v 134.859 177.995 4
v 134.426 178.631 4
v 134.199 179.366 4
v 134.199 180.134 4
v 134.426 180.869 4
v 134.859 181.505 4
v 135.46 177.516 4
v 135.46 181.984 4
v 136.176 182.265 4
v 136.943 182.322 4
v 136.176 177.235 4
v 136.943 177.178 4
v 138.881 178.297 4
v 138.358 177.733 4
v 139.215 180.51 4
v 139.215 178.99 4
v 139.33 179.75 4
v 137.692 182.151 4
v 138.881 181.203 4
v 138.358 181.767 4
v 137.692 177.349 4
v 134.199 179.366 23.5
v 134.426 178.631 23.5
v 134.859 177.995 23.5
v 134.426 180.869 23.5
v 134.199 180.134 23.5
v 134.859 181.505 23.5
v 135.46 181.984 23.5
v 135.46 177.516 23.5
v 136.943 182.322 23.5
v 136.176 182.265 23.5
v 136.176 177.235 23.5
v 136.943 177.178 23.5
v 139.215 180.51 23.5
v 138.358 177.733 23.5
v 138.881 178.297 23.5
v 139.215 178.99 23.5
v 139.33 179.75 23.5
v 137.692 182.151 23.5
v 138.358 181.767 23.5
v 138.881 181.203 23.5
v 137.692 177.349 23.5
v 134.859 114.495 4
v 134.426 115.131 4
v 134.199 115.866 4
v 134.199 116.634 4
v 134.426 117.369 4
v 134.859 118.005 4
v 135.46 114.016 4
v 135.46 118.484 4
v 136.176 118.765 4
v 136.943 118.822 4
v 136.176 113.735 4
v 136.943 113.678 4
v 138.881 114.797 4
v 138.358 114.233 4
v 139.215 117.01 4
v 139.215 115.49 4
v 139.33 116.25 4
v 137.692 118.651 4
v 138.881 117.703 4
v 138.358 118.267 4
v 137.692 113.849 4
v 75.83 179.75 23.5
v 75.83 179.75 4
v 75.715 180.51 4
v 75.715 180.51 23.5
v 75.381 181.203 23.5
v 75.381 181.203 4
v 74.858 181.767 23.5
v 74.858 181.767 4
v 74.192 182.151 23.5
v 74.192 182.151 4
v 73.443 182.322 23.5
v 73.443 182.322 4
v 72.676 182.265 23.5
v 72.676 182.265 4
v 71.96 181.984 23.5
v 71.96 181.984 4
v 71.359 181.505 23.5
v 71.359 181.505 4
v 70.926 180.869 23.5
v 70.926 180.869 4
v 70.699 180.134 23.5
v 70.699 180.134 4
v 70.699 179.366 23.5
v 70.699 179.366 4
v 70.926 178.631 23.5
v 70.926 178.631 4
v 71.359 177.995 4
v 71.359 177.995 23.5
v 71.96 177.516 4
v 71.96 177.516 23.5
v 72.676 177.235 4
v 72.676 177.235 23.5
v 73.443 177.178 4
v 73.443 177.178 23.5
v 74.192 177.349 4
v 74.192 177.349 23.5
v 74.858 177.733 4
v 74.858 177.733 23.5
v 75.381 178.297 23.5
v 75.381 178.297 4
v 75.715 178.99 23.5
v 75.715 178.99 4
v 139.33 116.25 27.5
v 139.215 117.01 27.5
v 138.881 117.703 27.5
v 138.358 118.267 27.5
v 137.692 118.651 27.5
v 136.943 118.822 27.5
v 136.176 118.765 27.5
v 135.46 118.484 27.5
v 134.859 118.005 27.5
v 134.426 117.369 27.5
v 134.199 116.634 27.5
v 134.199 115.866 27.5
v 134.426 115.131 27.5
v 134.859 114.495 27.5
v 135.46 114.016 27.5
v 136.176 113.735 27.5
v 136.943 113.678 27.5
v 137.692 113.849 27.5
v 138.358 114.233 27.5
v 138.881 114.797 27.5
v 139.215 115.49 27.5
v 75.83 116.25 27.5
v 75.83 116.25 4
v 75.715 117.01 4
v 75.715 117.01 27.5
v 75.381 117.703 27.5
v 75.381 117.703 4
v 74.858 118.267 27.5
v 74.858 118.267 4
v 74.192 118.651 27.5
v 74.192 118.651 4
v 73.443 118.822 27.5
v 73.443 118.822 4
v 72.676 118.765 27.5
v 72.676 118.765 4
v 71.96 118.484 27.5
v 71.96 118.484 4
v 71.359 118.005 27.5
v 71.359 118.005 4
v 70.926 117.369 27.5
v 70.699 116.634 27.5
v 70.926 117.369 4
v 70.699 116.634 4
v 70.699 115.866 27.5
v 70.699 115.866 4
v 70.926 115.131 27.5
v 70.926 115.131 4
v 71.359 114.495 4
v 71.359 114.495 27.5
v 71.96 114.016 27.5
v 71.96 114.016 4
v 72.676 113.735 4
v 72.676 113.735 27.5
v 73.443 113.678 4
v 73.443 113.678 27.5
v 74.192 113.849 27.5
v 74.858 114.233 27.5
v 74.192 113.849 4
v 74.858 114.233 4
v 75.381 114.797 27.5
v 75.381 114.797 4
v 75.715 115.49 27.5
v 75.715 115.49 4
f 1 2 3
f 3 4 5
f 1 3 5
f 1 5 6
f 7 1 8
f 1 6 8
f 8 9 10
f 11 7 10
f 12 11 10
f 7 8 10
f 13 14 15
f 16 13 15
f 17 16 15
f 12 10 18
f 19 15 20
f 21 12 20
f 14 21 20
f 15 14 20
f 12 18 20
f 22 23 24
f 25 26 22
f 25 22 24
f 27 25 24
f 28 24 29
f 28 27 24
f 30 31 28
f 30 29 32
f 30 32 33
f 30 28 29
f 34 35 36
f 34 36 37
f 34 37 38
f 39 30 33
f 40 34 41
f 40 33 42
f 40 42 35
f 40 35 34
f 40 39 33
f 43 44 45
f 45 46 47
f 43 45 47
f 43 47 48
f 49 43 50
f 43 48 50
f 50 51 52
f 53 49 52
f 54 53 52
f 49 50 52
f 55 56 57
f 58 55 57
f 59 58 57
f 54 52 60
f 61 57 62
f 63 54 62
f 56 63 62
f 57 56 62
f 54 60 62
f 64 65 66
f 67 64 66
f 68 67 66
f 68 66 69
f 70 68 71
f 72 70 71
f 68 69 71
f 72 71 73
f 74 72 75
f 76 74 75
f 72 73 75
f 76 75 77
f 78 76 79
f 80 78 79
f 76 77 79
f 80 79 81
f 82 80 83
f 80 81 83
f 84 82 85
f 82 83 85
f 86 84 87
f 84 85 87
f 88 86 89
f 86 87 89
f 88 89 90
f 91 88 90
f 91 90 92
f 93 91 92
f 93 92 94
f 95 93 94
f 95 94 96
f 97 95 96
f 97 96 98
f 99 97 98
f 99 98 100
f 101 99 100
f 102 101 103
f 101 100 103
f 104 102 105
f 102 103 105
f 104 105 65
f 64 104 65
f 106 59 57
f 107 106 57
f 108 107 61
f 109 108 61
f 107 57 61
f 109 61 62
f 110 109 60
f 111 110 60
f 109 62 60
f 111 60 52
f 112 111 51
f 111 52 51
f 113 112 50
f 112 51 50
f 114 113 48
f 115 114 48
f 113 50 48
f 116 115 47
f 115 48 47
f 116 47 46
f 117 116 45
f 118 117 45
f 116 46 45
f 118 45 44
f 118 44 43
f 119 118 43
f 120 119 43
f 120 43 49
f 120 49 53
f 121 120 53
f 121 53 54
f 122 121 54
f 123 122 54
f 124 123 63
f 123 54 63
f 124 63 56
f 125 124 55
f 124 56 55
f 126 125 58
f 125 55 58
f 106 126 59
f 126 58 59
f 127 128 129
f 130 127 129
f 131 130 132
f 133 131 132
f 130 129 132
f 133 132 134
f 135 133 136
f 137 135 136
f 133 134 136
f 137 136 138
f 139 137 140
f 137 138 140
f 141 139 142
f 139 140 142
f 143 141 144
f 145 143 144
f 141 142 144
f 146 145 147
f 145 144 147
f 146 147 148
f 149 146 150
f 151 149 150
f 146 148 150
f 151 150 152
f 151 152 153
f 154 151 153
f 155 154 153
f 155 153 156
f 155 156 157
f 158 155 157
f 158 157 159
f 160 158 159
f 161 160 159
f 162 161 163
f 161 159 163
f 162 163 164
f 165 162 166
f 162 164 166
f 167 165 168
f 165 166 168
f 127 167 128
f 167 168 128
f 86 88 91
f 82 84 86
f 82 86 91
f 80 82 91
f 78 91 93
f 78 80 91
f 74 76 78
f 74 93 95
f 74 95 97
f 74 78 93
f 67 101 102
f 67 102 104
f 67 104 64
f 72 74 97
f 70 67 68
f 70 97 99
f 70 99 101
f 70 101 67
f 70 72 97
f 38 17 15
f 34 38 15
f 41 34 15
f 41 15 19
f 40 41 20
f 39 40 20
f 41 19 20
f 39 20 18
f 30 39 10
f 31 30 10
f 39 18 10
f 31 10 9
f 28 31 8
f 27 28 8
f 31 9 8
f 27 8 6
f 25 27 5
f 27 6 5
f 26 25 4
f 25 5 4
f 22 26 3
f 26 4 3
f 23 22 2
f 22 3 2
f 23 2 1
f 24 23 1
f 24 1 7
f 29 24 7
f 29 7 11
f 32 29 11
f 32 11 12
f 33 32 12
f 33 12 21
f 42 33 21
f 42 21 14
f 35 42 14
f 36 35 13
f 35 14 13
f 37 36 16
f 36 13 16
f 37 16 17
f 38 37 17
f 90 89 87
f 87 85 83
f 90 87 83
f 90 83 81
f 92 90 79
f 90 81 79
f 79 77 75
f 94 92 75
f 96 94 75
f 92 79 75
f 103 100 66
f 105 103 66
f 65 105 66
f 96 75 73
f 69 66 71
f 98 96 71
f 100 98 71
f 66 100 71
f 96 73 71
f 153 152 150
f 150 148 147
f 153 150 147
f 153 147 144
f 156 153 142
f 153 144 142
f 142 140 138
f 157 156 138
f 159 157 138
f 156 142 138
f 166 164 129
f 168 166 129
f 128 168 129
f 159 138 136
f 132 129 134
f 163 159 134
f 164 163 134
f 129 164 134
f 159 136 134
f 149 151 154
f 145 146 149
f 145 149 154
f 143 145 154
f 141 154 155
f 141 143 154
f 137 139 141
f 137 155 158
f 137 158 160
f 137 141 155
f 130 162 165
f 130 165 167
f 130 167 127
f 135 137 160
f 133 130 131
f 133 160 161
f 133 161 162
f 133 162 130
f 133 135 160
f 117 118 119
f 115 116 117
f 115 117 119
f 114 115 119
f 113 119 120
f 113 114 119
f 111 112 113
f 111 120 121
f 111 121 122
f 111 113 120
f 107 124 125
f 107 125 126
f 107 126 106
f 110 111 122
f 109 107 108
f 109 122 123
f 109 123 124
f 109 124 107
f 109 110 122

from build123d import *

# Parameters (mm, degrees)
CYLINDER015_R     = 2.579687
CYLINDER015_DEPTH = 23.5
CYLINDER014_R     = 2.579687
CYLINDER014_DEPTH = 19.5
CYLINDER013_R     = 2.579687
CYLINDER013_DEPTH = 19.5
CYLINDER016_R     = 2.579687
CYLINDER016_DEPTH = 23.5


with BuildPart() as threaded003:
    # Cylinder015 → Cylinder015 (new body)
    with BuildSketch(Plane(origin=(73.25, 116.25, 4), x_dir=(1, 0, 0), z_dir=(0, 0, 1))):
        Circle(CYLINDER015_R)
    extrude(amount=CYLINDER015_DEPTH)


with BuildPart() as threaded002:
    # Cylinder014 → Cylinder014 (new body)
    with BuildSketch(Plane(origin=(73.25, 179.75, 4), x_dir=(1, 0, 0), z_dir=(0, 0, 1))):
        Circle(CYLINDER014_R)
    extrude(amount=CYLINDER014_DEPTH)


with BuildPart() as threaded001:
    # Cylinder013 → Cylinder013 (new body)
    with BuildSketch(Plane(origin=(136.75, 179.75, 4), x_dir=(1, 0, 0), z_dir=(0, 0, 1))):
        Circle(CYLINDER013_R)
    extrude(amount=CYLINDER013_DEPTH)


with BuildPart() as risers:
    # Cylinder016 → Cylinder016 (new body)
    with BuildSketch(Plane(origin=(136.75, 116.25, 4), x_dir=(1, 0, 0), z_dir=(0, 0, 1))):
        Circle(CYLINDER016_R)
    extrude(amount=CYLINDER016_DEPTH)

    # Fusion003: union Threaded003, Threaded002, Threaded001
    add(threaded003.part)
    add(threaded002.part)
    add(threaded001.part)


solid = risers.part
